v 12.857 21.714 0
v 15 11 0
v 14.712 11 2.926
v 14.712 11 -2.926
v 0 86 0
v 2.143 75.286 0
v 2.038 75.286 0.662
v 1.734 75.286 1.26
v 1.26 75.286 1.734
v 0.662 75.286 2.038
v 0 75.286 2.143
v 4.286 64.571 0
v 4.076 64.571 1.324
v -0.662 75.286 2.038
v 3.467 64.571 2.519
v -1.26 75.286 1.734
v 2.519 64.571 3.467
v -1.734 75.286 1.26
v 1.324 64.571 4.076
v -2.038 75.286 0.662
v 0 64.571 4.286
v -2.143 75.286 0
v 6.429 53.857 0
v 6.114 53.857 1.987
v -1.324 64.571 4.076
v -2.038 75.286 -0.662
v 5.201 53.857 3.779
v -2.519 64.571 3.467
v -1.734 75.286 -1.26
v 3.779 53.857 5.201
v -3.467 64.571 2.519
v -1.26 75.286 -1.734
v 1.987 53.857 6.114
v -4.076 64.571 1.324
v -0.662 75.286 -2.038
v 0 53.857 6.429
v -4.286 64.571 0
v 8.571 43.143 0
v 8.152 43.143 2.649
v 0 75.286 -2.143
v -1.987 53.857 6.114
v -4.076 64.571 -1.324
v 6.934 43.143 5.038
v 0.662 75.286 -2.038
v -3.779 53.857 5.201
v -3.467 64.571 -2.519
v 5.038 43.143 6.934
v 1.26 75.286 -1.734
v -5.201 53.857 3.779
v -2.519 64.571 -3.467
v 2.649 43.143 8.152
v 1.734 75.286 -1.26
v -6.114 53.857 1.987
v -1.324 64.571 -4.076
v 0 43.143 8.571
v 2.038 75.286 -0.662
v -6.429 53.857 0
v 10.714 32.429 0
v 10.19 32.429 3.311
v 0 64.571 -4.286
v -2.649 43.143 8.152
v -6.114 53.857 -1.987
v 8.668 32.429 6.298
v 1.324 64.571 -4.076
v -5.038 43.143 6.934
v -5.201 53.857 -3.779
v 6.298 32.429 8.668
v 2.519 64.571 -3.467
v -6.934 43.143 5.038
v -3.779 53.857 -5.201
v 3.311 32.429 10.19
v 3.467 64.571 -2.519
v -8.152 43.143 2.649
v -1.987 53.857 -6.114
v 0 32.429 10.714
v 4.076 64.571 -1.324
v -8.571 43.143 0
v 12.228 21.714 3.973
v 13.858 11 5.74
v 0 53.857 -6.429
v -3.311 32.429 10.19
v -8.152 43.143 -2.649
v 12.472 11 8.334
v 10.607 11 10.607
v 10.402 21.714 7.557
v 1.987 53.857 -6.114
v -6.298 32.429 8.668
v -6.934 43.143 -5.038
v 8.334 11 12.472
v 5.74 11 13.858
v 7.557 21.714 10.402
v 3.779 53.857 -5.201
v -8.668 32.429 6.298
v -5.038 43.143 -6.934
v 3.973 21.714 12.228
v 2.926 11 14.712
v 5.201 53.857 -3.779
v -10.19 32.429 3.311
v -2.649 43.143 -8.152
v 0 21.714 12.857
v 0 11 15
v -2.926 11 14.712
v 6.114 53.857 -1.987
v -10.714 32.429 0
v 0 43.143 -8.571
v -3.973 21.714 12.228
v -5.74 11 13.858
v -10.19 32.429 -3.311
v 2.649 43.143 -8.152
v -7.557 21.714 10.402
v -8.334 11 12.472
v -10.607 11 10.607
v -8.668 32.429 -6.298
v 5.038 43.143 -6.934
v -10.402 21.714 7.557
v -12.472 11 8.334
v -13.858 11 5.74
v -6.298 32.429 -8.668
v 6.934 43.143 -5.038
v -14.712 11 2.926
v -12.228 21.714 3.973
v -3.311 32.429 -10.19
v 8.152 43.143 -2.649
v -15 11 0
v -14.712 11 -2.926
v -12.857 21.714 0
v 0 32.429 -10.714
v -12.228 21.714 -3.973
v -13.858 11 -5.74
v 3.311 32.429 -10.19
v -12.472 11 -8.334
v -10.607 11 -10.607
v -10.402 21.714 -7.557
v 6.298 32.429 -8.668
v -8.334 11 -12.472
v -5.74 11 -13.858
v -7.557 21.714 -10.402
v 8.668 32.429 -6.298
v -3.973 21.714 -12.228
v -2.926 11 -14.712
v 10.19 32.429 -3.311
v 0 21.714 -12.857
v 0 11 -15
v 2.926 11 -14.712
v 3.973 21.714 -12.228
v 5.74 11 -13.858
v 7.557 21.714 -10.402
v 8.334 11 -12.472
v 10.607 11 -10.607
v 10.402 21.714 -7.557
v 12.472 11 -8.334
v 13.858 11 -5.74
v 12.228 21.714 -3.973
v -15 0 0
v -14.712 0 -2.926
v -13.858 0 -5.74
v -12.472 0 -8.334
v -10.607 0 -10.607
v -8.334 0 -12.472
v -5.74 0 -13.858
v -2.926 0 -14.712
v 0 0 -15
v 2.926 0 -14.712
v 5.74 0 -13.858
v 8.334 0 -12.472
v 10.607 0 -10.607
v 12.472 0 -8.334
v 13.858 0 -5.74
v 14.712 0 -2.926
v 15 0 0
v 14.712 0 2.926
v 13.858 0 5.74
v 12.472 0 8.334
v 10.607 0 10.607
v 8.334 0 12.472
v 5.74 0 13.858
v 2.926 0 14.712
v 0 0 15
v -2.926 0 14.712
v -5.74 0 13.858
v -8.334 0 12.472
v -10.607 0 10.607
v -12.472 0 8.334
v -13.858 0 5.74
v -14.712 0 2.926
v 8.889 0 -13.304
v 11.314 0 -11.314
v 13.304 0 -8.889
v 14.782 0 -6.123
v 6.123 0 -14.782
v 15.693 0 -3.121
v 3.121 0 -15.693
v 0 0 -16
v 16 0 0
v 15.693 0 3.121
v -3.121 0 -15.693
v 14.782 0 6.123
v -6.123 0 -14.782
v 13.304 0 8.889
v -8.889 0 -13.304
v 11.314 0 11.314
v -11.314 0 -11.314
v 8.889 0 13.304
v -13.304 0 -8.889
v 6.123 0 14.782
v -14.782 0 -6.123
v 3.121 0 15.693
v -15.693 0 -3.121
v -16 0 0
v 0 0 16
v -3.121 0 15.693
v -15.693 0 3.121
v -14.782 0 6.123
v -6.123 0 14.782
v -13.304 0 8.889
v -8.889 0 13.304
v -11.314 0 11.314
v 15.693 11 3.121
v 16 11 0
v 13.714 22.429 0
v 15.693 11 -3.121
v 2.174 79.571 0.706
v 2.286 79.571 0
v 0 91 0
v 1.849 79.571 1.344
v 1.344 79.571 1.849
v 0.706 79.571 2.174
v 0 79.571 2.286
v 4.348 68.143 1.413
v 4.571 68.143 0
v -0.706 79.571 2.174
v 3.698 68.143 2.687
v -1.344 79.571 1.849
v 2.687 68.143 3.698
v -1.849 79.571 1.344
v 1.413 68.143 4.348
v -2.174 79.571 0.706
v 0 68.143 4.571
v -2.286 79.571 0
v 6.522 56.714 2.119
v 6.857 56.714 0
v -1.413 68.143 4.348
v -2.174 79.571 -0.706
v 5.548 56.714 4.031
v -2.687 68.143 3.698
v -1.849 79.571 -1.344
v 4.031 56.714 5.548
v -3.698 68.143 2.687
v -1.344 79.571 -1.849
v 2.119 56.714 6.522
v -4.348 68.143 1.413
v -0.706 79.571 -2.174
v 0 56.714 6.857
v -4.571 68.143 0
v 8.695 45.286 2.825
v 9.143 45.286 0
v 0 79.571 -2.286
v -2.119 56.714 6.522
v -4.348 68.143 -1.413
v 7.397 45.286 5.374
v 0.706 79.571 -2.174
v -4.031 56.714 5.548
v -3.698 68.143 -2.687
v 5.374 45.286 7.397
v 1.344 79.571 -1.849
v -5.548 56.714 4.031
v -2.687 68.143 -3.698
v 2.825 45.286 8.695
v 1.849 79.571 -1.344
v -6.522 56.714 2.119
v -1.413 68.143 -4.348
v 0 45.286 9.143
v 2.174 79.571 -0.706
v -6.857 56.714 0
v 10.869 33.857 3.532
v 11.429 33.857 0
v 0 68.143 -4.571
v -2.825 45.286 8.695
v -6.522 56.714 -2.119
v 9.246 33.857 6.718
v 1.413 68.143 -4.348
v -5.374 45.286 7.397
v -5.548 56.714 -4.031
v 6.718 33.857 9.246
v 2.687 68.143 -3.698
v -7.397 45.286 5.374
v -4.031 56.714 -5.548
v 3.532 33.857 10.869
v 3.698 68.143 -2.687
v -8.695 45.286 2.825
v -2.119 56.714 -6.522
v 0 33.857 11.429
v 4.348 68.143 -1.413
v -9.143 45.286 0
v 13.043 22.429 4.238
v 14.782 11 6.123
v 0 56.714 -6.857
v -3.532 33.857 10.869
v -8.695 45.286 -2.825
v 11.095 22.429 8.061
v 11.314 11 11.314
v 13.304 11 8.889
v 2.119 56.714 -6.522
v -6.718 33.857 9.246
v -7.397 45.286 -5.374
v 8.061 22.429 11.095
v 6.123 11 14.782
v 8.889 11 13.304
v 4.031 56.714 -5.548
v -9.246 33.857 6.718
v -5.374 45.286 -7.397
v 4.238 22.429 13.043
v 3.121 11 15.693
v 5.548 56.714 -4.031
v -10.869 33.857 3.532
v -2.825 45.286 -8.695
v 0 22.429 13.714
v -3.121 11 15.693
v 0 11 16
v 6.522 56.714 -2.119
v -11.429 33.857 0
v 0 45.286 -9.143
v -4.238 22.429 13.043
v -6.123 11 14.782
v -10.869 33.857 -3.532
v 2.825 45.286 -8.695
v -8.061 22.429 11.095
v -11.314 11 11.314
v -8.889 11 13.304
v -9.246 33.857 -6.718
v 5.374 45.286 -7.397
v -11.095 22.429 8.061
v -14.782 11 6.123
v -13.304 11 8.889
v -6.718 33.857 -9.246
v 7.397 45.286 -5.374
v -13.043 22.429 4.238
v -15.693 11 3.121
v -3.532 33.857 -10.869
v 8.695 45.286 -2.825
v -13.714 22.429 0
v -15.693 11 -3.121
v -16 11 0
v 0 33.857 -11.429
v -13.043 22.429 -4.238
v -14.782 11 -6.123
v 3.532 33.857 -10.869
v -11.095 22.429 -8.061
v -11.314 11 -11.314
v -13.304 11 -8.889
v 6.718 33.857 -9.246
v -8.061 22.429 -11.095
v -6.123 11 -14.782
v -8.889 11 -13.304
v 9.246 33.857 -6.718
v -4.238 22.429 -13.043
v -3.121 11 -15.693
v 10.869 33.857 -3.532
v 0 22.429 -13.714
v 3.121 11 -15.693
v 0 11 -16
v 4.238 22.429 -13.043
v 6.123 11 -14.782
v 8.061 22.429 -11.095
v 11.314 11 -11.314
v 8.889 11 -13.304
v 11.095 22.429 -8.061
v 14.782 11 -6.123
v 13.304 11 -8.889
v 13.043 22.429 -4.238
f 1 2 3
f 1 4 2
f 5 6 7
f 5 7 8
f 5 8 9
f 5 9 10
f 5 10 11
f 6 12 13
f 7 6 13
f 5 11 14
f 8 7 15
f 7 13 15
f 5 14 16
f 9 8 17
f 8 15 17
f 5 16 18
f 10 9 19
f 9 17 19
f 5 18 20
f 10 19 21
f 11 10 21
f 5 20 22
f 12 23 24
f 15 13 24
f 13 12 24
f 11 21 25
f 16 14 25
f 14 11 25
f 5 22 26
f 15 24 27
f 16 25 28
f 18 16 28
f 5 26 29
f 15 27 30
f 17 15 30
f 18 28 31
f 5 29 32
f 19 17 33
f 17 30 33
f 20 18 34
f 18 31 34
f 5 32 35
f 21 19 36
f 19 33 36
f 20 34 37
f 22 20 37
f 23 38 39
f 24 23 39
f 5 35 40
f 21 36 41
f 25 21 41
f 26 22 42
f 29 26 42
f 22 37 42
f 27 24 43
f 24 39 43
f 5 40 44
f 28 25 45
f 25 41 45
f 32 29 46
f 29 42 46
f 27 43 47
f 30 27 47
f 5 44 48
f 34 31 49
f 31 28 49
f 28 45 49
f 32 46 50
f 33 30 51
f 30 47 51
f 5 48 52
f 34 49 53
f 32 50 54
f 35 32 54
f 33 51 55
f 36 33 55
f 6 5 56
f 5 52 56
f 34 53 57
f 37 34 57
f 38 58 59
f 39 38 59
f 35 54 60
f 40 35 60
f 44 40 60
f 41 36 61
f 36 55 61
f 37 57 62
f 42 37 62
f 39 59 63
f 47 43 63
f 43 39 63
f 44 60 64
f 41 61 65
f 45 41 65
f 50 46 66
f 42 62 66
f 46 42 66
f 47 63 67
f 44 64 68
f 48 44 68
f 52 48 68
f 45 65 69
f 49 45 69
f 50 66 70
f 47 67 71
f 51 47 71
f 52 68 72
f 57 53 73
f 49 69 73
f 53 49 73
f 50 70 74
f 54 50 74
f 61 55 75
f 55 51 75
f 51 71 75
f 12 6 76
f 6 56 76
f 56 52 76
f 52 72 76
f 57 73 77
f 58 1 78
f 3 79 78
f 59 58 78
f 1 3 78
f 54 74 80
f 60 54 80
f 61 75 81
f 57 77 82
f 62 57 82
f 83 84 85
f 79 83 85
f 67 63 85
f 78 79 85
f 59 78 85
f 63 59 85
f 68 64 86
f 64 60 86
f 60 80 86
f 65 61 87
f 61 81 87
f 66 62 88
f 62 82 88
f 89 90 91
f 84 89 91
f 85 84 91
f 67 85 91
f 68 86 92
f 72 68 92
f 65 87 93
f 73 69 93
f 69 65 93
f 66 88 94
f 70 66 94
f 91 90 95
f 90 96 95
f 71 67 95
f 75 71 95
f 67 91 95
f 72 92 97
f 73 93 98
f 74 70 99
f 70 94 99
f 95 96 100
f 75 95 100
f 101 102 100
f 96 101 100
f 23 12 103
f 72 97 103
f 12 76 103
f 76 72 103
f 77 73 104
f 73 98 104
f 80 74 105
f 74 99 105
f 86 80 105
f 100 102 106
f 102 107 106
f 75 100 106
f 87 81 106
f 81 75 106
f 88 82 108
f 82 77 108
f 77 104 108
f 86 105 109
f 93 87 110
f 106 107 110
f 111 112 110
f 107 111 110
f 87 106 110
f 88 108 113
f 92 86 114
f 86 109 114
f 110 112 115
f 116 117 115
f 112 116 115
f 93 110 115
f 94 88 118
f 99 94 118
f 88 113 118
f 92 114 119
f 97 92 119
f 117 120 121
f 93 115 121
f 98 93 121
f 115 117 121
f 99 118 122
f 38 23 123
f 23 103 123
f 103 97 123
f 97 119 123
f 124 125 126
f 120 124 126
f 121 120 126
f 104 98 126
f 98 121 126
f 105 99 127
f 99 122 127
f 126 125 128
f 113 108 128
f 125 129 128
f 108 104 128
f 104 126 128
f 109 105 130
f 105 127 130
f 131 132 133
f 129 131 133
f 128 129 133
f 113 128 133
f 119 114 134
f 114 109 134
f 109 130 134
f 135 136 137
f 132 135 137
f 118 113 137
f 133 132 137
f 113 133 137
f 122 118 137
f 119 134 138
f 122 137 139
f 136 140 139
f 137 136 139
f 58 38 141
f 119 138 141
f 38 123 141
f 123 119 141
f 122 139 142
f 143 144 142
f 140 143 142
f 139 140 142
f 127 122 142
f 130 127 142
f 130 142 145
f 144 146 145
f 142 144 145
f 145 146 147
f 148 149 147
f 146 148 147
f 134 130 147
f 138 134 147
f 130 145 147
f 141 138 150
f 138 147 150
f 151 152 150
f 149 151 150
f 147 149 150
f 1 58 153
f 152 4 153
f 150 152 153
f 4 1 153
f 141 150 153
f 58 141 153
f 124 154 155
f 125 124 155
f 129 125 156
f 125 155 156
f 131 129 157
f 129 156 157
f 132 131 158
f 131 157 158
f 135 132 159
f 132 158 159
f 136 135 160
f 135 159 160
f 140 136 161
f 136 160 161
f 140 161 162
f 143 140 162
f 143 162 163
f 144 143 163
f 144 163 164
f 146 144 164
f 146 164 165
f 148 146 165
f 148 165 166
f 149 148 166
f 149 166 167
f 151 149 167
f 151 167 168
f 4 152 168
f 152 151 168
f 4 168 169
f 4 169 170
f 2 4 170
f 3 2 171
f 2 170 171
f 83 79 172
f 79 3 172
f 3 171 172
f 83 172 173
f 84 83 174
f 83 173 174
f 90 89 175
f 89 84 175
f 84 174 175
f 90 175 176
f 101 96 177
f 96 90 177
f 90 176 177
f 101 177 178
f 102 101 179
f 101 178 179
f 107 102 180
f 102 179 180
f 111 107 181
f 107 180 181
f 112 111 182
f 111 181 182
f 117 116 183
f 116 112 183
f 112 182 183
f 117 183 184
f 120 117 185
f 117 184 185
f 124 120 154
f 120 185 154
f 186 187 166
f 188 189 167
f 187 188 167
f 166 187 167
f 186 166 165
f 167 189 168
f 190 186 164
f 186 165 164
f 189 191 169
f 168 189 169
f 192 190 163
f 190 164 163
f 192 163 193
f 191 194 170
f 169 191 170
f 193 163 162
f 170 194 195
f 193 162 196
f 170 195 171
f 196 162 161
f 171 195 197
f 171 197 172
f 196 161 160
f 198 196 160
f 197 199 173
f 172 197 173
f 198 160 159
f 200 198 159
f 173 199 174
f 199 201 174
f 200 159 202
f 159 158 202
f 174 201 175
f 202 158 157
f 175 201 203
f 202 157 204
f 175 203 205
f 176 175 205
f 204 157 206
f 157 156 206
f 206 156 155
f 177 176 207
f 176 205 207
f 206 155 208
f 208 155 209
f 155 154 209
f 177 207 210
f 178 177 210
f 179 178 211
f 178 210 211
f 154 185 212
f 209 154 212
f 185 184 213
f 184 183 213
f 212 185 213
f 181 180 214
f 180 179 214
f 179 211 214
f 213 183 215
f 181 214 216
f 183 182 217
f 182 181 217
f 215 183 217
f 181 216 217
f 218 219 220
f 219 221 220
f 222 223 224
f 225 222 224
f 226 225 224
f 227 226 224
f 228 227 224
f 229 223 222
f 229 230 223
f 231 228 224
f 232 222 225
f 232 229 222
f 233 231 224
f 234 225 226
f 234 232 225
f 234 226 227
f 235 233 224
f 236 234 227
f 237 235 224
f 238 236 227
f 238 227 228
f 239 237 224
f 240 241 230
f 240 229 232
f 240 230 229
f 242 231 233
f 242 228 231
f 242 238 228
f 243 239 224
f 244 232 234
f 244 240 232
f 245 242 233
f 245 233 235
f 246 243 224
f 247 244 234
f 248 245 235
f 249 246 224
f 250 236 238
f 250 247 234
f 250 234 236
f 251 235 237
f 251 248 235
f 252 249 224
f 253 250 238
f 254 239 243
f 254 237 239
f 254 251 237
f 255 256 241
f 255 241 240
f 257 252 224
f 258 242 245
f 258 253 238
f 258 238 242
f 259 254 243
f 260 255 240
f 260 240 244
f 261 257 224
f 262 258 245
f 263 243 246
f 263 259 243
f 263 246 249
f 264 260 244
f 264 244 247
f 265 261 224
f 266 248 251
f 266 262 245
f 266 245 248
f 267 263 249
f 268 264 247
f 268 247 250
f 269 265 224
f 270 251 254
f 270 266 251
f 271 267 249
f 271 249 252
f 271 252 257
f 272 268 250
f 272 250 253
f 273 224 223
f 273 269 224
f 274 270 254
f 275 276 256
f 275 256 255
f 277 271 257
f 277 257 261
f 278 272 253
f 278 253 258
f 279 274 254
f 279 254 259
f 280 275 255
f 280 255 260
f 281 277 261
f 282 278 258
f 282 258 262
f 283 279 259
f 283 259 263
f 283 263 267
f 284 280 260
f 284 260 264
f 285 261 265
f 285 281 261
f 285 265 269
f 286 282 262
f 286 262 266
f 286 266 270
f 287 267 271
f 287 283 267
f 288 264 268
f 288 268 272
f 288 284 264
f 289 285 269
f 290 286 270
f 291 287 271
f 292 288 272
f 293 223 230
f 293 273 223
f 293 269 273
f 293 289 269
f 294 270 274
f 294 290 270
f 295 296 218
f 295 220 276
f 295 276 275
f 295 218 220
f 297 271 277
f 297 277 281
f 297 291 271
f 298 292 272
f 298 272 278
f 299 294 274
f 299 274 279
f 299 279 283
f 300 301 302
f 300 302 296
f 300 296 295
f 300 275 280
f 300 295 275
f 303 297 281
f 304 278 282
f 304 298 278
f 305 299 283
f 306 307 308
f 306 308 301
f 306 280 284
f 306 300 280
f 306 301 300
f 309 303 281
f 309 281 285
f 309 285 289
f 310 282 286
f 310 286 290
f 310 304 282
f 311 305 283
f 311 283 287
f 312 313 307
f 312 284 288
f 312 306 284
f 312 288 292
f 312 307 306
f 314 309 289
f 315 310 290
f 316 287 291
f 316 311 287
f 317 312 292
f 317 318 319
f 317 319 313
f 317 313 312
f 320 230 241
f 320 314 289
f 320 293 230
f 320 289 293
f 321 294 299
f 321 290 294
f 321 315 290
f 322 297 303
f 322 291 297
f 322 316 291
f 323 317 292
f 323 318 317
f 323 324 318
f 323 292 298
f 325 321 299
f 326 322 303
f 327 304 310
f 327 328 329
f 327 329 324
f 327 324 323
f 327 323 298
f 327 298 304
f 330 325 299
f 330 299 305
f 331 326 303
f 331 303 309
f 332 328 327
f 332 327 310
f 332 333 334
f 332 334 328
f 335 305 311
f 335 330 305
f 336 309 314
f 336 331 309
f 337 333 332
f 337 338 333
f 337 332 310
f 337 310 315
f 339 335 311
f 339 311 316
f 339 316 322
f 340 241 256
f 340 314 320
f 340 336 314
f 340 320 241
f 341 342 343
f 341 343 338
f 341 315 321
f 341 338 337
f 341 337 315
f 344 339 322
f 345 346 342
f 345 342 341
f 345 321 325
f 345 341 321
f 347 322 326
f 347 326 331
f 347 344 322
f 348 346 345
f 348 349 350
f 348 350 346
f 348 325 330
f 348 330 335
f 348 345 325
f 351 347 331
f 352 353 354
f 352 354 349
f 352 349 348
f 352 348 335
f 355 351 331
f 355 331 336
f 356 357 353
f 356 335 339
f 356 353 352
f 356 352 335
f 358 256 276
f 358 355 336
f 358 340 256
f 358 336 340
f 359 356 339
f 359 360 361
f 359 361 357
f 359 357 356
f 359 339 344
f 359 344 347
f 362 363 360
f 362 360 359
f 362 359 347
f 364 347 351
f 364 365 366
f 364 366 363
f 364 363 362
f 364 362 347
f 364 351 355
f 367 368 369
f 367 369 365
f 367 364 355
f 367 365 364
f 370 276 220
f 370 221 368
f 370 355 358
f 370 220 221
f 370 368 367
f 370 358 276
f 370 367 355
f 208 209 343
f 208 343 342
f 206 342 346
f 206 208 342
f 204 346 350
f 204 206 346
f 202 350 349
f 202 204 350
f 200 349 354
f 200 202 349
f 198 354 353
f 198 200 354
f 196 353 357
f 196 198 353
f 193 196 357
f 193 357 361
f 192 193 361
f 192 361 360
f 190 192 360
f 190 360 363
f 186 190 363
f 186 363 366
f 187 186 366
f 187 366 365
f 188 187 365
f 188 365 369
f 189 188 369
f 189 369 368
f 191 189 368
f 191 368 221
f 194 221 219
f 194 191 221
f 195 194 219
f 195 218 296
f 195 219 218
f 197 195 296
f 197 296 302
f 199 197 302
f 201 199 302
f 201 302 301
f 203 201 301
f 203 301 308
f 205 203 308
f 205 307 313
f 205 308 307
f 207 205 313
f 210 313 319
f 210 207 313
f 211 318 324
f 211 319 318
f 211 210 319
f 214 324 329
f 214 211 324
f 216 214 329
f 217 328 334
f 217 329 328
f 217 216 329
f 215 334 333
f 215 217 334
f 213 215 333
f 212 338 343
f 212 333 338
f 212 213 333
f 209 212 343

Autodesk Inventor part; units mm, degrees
sketch "Эскиз1" plane through (0, 0, 0) normal (0, 1, 0) x (-1, 0, 0)
  circle A0 centre (0, 0) radius 15
  circle A1 centre (0, 0) radius 16
  dimension "d0" = 30
  dimension "d1" = 32
extrude "Выдавливание1" add sketch "Эскиз1" along normal blind 11
ref_plane "РабПлоскость1" through (0, 91, 0) normal (0, 1, 0) x (1, 0, 0)
sketch "Эскиз3" plane through (0, 91, 0) normal (0, 1, 0) x (1, 0, 0)
  point P0 (0, 0)
  point P1 (0, 0)
  point P2 (0, 0)
sketch "Эскиз4" plane through (0, 11, 0) normal (0, 1, 0) x (1, 0, 0)
  circle A0 centre (0, 0) radius 16 projected
sketch "Эскиз6" plane through (0, 0, 0) normal (0, 0, 1) x (1, 0, 0)
  line L0 (0, 91) -> (16, 11)
  line L1 (0, 111.2721) -> (0, 58.6292)
  line L2 (16, 11) -> (0, 11)
  line L3 (16, 11) -> (-16, 11) projected
  line L4 (0, 91) -> (0, 11)
  point P0 (0, 0)
  dimension "d10" = 16
  dimension "d11" = 3.9757
  dimension "d12" = 6.3484
revolve "Вращение1" add sketch "Эскиз6" angle 360 about axis through (0, 111.2721, 0) along (0, -1, 0)
sketch "Эскиз7" plane through (0, 0, 0) normal (0, 0, 1) x (1, 0, 0)
  line L0 (15, 11) -> (0, 86)
  line L1 (0, 91) -> (16, 11) projected
  line L2 (0, 109.2) -> (0, -18.2) projected
  line L3 (0, 86) -> (0, 11)
  line L4 (-15, 11) -> (15, 11) projected
  line L5 (0, 11) -> (15, 11)
  point P0 (0, 0)
revolve "Вращение2" cut sketch "Эскиз7" angle 360 about axis through (0, 86, 0) along (0, -1, 0)
properties part number "Головной обтекатель"
